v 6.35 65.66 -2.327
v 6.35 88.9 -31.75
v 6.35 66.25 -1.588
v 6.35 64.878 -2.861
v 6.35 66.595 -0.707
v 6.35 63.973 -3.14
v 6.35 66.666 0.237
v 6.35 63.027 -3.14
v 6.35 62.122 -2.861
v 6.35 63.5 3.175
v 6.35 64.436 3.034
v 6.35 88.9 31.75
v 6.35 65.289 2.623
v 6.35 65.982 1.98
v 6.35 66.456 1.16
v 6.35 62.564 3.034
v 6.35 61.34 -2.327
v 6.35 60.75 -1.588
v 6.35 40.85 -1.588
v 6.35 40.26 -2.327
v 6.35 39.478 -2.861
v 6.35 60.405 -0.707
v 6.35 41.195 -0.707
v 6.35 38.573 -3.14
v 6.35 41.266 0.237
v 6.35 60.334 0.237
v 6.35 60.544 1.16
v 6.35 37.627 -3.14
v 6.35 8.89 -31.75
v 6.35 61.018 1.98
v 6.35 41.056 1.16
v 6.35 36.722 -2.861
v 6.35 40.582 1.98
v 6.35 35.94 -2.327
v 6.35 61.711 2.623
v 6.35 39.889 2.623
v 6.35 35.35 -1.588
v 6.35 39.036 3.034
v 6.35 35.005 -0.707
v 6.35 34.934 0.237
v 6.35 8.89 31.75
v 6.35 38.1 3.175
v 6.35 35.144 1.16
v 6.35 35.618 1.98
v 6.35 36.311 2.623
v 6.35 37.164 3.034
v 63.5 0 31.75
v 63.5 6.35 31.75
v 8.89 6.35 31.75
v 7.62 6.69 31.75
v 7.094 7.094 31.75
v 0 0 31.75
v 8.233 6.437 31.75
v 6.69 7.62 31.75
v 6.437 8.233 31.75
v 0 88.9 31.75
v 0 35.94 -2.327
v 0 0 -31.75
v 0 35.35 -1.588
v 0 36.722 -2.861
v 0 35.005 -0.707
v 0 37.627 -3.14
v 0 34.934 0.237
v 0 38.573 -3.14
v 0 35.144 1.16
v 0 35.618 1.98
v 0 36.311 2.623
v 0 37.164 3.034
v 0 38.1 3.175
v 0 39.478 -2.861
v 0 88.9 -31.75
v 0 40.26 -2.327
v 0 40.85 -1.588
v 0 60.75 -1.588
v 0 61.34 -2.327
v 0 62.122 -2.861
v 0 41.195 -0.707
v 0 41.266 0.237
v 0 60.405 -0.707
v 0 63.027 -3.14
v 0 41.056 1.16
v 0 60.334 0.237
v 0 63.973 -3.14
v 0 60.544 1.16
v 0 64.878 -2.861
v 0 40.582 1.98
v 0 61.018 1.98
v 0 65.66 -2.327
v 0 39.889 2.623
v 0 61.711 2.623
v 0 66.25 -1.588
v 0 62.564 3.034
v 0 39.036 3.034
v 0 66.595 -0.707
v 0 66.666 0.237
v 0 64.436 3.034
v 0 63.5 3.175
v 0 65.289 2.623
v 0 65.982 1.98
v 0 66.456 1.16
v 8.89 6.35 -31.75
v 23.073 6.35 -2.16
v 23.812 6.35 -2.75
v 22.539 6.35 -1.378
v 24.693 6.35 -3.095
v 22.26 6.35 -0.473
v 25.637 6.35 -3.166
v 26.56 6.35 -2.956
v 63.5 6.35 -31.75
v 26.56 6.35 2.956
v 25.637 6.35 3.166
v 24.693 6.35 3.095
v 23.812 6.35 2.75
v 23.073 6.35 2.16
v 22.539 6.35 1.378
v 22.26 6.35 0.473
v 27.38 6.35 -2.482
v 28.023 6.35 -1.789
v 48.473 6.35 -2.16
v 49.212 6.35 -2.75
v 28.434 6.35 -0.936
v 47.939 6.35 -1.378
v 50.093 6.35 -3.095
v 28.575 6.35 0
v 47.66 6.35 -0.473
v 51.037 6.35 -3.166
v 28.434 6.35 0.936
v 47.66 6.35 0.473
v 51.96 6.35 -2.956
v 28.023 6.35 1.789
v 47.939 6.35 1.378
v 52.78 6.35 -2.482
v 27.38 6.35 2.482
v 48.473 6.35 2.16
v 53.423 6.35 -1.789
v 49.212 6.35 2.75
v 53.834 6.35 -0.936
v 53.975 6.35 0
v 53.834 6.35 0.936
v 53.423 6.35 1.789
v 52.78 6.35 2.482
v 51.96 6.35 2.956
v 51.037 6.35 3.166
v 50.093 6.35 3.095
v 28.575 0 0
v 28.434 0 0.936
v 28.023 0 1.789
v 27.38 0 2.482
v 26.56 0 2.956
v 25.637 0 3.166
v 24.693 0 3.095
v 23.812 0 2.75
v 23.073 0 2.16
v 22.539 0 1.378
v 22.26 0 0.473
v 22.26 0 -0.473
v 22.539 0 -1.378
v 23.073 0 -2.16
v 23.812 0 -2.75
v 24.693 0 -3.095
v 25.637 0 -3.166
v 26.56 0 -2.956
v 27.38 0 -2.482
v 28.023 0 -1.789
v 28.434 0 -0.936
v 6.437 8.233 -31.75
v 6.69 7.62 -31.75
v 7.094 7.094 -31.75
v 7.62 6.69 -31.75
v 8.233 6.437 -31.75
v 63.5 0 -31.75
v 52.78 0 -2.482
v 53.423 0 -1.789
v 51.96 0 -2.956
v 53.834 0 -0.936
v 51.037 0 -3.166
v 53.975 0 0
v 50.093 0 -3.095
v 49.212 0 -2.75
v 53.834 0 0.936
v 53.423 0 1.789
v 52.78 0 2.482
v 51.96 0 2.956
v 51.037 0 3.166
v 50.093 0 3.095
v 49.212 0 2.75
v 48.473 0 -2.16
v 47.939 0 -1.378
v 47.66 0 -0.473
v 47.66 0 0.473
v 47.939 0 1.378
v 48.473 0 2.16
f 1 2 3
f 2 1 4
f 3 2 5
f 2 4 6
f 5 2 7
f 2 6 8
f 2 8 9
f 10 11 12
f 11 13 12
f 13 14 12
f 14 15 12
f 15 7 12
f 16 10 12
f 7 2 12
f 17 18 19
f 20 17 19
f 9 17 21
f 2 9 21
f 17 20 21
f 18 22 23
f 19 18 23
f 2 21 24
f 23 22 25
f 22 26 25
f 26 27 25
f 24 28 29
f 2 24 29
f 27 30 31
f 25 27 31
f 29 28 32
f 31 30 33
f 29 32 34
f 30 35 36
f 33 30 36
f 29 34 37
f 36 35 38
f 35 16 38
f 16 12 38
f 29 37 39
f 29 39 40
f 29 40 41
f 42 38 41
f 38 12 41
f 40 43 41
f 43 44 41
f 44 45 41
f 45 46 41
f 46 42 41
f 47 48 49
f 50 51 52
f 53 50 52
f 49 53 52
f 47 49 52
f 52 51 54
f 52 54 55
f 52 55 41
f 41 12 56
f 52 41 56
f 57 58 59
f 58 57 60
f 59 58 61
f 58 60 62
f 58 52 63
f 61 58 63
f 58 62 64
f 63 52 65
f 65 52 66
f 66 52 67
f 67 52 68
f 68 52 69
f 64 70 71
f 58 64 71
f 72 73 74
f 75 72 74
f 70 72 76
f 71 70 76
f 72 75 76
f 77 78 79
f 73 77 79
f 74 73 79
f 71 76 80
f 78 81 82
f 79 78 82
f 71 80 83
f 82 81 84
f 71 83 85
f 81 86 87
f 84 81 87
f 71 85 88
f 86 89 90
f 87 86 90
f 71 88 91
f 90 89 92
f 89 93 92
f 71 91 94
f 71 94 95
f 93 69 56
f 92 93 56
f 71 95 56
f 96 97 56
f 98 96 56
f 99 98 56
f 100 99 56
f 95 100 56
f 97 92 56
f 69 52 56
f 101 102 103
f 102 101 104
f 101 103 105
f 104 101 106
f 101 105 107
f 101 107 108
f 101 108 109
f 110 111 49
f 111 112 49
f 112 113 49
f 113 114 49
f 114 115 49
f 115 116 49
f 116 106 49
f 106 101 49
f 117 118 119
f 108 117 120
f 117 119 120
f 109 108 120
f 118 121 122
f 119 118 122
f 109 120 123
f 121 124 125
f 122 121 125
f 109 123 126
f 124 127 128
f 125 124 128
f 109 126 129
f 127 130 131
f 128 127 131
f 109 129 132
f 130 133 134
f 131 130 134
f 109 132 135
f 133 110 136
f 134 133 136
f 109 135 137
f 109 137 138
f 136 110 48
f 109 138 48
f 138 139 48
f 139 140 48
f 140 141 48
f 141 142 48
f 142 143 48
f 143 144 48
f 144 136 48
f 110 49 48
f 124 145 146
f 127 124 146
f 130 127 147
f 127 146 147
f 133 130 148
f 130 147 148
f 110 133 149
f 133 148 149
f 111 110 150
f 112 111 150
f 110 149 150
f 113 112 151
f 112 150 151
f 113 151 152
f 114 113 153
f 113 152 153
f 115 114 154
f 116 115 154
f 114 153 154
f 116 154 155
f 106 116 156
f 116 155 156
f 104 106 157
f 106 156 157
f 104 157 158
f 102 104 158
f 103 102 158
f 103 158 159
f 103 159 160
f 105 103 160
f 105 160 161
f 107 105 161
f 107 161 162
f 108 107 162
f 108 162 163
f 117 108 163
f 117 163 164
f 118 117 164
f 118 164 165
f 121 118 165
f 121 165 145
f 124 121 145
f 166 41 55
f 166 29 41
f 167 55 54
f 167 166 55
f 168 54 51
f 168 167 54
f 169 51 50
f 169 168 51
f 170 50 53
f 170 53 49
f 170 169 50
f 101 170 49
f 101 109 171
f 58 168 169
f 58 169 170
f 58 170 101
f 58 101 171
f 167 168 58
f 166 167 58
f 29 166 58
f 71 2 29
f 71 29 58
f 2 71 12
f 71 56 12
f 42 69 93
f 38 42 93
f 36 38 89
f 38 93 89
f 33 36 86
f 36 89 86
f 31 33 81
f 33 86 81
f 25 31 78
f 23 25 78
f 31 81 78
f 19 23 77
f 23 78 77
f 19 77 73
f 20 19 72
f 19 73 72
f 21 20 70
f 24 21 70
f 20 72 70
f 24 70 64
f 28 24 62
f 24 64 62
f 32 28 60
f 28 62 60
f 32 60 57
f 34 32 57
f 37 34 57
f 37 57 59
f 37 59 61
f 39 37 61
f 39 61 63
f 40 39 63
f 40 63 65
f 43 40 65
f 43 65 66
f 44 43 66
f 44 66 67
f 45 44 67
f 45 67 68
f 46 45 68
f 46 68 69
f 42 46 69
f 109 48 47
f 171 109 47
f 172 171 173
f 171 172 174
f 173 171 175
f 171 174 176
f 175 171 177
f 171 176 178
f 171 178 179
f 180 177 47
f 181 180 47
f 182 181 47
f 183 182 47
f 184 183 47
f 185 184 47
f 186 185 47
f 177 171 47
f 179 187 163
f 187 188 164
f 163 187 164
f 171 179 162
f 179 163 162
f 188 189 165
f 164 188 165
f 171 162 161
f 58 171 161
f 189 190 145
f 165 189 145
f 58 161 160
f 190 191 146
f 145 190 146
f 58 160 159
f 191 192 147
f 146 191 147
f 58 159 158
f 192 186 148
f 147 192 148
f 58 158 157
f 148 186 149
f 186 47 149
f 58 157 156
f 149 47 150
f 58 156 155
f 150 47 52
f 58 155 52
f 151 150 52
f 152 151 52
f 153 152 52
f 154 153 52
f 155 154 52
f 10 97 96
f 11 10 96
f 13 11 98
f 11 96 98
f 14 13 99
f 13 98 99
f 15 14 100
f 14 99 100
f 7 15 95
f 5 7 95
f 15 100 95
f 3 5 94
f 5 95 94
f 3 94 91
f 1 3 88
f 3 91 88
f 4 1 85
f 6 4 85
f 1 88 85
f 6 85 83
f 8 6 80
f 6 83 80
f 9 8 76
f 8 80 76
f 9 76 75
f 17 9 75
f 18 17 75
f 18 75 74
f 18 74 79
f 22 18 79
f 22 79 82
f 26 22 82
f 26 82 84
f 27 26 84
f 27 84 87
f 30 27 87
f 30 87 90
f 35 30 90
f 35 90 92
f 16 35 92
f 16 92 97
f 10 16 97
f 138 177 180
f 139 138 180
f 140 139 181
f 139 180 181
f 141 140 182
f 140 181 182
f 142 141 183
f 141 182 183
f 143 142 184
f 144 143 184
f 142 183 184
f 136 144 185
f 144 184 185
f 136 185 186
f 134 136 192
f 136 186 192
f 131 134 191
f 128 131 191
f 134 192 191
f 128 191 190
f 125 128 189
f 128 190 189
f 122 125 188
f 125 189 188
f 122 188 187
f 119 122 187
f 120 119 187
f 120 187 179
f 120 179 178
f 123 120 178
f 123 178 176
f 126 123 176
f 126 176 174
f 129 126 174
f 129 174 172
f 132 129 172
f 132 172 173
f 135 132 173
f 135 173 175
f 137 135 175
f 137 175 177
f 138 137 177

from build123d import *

# Parameters (mm, degrees)
BOSS_EXTRUDE2_DEPTH = 31.75
CUT_EXTRUDE1_REACH  = 115.77
SKETCH2_R           = 3.175
CUT_EXTRUDE2_REACH  = 115.77
SKETCH3_R           = 3.175
FILLET2_R           = 2.54


with BuildPart() as part:
    # Sketch1 → Boss-Extrude2 (new, symmetric)
    with BuildSketch(Plane.XY):
        Polygon((0, 0), (0, 88.9), (6.35, 88.9), (6.35, 6.35), (63.5, 6.35), (63.5, 0), align=None)
    extrude(amount=BOSS_EXTRUDE2_DEPTH, both=True)

    # Sketch2 → Cut-Extrude1 (cut, up to next)
    with BuildSketch(Plane.ZY, mode=Mode.PRIVATE) as cut_extrude1_sk1:
        with Locations((0, 63.5)):
            Circle(SKETCH2_R)
    cut_extrude1_tool1 = extrude(cut_extrude1_sk1.sketch, amount=-CUT_EXTRUDE1_REACH, mode=Mode.PRIVATE) & part.part
    # Sketch2 → Cut-Extrude1 (cut, up to next)
    with BuildSketch(Plane.ZY, mode=Mode.PRIVATE) as cut_extrude1_sk2:
        with Locations((0, 38.1)):
            Circle(SKETCH2_R)
    cut_extrude1_tool2 = extrude(cut_extrude1_sk2.sketch, amount=-CUT_EXTRUDE1_REACH, mode=Mode.PRIVATE) & part.part
    add(cut_extrude1_tool1.solids().sort_by_distance((0, 63.5, 0))[0], mode=Mode.SUBTRACT)
    add(cut_extrude1_tool2.solids().sort_by_distance((0, 38.1, 0))[0], mode=Mode.SUBTRACT)

    # Sketch3 → Cut-Extrude2 (cut, up to next)
    with BuildSketch(Plane.XZ, mode=Mode.PRIVATE) as cut_extrude2_sk1:
        with Locations((25.4, 0)):
            Circle(SKETCH3_R)
    cut_extrude2_tool1 = extrude(cut_extrude2_sk1.sketch, amount=-CUT_EXTRUDE2_REACH, mode=Mode.PRIVATE) & part.part
    # Sketch3 → Cut-Extrude2 (cut, up to next)
    with BuildSketch(Plane.XZ, mode=Mode.PRIVATE) as cut_extrude2_sk2:
        with Locations((50.8, 0)):
            Circle(SKETCH3_R)
    cut_extrude2_tool2 = extrude(cut_extrude2_sk2.sketch, amount=-CUT_EXTRUDE2_REACH, mode=Mode.PRIVATE) & part.part
    add(cut_extrude2_tool1.solids().sort_by_distance((25.4, 0, 0))[0], mode=Mode.SUBTRACT)
    add(cut_extrude2_tool2.solids().sort_by_distance((50.8, 0, 0))[0], mode=Mode.SUBTRACT)

    # Fillet2
    fillet2_edges = [part.edges().sort_by_distance(p)[0] for p in [
        (6.35, 6.35, 0),
    ]]
    fillet(fillet2_edges, radius=FILLET2_R)


solid = part.part
